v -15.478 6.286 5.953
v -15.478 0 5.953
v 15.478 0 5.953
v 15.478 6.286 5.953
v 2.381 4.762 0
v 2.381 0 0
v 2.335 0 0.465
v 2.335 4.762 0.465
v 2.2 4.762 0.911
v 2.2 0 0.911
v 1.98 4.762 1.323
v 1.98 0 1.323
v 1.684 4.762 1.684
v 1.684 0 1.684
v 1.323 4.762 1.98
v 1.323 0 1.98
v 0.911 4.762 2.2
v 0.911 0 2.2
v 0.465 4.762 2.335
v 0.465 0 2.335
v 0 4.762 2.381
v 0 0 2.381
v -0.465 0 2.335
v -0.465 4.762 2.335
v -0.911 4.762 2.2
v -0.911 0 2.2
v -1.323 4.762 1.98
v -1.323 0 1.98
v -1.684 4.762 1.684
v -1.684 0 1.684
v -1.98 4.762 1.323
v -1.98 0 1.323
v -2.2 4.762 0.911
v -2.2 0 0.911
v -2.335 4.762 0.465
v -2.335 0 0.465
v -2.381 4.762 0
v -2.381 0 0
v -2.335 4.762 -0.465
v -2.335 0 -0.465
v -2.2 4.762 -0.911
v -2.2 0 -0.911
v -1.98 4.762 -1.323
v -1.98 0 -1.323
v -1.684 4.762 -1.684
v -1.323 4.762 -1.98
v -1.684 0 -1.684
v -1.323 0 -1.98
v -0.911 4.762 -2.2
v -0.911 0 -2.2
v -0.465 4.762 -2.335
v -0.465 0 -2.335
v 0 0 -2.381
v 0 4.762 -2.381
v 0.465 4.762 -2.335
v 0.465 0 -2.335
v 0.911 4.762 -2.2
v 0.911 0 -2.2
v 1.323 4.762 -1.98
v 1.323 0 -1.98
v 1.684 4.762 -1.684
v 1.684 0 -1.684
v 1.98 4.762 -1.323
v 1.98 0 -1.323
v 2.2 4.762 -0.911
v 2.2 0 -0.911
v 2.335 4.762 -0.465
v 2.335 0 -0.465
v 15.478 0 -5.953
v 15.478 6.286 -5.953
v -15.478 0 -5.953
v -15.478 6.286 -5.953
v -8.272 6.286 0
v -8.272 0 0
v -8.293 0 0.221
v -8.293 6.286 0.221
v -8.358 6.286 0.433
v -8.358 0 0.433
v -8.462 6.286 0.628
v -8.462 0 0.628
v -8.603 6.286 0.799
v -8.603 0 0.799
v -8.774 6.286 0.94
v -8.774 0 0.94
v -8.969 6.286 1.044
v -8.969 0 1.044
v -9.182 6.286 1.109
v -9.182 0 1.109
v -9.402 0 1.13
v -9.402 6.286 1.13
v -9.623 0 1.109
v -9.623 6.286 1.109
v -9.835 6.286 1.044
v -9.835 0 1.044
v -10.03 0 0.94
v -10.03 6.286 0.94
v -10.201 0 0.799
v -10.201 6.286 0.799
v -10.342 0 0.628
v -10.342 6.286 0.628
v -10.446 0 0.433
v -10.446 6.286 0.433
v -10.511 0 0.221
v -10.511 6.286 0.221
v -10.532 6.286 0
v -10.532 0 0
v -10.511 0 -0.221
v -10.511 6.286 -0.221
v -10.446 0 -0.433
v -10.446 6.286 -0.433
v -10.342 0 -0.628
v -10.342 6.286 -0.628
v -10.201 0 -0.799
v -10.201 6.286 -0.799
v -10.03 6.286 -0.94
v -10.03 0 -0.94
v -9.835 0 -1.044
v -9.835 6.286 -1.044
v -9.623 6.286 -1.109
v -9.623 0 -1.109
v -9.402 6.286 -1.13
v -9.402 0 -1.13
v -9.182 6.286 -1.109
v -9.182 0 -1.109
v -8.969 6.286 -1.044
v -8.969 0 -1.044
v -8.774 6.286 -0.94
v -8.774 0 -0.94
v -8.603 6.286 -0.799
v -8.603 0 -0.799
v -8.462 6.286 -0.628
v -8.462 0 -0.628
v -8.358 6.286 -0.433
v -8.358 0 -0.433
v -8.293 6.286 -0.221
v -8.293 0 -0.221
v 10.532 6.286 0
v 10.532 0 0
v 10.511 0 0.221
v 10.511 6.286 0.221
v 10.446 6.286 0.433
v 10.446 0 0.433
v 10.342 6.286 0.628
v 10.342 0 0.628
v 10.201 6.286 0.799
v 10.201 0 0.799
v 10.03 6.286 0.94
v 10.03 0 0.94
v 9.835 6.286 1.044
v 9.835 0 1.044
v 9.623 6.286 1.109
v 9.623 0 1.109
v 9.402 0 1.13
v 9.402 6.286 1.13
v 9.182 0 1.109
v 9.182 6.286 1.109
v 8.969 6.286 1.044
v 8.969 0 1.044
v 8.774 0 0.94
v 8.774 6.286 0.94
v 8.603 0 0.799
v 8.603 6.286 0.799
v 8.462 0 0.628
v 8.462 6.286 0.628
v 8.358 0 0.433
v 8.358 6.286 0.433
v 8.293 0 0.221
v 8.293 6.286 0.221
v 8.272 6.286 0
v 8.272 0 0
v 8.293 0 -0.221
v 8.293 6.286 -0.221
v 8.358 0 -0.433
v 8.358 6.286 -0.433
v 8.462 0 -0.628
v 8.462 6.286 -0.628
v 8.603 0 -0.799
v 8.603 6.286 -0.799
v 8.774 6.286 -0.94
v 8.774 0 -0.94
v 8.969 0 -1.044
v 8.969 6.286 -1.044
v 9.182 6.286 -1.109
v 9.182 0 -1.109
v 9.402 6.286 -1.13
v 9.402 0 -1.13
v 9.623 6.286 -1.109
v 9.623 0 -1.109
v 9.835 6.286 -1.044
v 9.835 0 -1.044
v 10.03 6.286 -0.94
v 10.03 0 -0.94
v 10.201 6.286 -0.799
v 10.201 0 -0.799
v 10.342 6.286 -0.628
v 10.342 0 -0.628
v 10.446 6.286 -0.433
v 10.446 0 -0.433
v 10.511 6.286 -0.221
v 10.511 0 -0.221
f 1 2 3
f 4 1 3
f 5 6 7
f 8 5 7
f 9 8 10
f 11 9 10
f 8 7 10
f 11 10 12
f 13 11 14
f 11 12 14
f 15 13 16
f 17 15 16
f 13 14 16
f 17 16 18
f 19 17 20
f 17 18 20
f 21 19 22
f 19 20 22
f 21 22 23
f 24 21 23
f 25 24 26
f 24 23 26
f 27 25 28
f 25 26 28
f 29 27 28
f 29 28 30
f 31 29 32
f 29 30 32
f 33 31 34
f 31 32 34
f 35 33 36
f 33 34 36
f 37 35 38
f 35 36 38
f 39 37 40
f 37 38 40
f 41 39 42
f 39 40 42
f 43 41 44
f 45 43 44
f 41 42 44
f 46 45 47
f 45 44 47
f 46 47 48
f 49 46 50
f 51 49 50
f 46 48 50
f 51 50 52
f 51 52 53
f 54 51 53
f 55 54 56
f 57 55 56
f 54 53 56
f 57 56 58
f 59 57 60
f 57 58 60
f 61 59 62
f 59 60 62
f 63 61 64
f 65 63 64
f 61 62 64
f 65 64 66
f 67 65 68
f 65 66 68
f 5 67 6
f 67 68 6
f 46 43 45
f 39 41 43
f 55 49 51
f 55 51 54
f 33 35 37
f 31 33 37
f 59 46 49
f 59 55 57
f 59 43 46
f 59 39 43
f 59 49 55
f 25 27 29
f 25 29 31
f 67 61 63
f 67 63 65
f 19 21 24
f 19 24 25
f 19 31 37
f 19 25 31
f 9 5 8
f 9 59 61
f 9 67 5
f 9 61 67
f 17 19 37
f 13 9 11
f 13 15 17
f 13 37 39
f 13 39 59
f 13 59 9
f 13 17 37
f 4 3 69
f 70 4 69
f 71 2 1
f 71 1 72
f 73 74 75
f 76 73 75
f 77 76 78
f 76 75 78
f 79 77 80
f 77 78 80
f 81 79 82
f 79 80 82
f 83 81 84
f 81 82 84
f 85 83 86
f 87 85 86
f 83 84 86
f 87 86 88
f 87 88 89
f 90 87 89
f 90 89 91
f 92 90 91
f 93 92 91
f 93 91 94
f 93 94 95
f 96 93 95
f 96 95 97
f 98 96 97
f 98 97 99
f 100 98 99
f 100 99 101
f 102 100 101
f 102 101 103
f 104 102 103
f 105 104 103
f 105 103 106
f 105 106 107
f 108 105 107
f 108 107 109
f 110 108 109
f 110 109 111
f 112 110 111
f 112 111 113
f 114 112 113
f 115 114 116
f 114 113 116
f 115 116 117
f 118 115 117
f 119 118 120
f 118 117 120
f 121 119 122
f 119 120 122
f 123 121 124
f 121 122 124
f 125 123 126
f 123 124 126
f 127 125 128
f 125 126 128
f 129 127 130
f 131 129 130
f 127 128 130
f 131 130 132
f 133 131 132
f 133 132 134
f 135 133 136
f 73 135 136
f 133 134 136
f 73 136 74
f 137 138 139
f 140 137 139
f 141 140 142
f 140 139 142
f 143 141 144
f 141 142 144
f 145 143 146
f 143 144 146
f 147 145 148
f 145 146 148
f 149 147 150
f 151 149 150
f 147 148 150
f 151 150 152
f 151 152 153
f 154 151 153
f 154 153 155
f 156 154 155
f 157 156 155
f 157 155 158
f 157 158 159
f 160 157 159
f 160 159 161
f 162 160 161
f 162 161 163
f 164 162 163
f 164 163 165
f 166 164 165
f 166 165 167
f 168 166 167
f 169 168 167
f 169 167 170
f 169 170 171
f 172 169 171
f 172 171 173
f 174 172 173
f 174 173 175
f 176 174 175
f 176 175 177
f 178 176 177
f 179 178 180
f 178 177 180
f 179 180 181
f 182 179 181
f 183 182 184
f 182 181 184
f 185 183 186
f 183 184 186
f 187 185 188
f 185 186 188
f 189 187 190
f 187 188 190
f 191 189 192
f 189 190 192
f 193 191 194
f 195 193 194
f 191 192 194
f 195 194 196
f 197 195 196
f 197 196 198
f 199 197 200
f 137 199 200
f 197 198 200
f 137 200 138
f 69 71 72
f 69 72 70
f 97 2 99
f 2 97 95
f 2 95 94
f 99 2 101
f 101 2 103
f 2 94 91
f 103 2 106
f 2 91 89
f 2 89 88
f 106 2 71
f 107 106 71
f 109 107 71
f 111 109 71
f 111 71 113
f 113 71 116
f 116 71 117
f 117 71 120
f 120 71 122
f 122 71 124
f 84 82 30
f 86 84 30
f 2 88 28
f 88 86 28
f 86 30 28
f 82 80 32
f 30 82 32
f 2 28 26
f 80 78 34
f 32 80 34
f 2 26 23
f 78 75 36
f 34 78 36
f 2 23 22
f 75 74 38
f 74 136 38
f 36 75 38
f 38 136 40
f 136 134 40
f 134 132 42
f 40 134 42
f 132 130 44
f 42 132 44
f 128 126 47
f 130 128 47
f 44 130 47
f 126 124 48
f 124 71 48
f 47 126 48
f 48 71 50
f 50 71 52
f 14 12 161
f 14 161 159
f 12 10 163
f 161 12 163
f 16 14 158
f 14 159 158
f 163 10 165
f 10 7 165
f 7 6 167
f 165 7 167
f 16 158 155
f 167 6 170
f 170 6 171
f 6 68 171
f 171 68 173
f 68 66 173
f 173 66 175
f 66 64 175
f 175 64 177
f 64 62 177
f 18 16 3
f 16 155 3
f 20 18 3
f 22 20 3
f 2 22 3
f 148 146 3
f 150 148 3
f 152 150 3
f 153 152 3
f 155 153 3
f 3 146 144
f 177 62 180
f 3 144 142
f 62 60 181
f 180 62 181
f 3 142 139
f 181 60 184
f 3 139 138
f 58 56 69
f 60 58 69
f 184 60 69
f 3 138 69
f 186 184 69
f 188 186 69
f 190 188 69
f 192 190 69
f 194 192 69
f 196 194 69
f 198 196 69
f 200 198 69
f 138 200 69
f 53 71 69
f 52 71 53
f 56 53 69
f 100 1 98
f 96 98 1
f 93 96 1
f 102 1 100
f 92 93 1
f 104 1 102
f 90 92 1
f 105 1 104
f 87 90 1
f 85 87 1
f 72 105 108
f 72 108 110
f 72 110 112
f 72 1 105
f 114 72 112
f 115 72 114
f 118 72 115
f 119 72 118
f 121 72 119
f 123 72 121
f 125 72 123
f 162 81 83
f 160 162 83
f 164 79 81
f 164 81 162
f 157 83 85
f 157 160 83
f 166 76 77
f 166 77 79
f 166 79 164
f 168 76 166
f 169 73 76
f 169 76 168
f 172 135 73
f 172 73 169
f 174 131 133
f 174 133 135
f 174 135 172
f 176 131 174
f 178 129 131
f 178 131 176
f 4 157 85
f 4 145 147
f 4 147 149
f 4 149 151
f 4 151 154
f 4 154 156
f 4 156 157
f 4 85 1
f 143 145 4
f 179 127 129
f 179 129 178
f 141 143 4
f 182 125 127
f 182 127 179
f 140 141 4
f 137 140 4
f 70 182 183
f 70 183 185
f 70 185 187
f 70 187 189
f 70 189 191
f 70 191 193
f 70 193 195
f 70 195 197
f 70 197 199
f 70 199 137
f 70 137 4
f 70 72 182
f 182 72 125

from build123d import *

# Parameters (mm, degrees)
SKETCH1_W                 = 30.95625
SKETCH1_H                 = 11.90625
BOSS_EXTRUDE1_DEPTH       = 6.2865
SKETCH2_R                 = 2.38125
CUT_EXTRUDE1_DEPTH        = 4.7625
F_4_40_TAPPED_HOLE1_D     = 2.2606
F_4_40_TAPPED_HOLE1_DEPTH = 8.89
F_4_40_TAPPED_HOLE1_TIP   = 0.679152758


with BuildPart() as part:
    # Sketch1 → Boss-Extrude1 (new body)
    with BuildSketch(Plane(origin=(0, 0, 0), x_dir=(1, 0, 0), z_dir=(0, 1, 0))):
        Rectangle(SKETCH1_W, SKETCH1_H)
    extrude(amount=BOSS_EXTRUDE1_DEPTH)

    # Sketch2 → Cut-Extrude1 (cut)
    with BuildSketch(Plane.XZ):
        Circle(SKETCH2_R)
    extrude(amount=-CUT_EXTRUDE1_DEPTH, mode=Mode.SUBTRACT)

    # #4-40 Tapped Hole1
    with Locations(Plane(origin=(0, 6.2865, 0), x_dir=(-1, 0, 0), z_dir=(0, 1, 0))):
        with Locations((9.402022244, 0), (-9.402022244, 0)):
            Hole(F_4_40_TAPPED_HOLE1_D / 2, depth=F_4_40_TAPPED_HOLE1_DEPTH)
            with Locations((0, 0, -(F_4_40_TAPPED_HOLE1_DEPTH + F_4_40_TAPPED_HOLE1_TIP / 2))):  # 118° drill point
                Cone(0, F_4_40_TAPPED_HOLE1_D / 2, F_4_40_TAPPED_HOLE1_TIP, mode=Mode.SUBTRACT)


solid = part.part
